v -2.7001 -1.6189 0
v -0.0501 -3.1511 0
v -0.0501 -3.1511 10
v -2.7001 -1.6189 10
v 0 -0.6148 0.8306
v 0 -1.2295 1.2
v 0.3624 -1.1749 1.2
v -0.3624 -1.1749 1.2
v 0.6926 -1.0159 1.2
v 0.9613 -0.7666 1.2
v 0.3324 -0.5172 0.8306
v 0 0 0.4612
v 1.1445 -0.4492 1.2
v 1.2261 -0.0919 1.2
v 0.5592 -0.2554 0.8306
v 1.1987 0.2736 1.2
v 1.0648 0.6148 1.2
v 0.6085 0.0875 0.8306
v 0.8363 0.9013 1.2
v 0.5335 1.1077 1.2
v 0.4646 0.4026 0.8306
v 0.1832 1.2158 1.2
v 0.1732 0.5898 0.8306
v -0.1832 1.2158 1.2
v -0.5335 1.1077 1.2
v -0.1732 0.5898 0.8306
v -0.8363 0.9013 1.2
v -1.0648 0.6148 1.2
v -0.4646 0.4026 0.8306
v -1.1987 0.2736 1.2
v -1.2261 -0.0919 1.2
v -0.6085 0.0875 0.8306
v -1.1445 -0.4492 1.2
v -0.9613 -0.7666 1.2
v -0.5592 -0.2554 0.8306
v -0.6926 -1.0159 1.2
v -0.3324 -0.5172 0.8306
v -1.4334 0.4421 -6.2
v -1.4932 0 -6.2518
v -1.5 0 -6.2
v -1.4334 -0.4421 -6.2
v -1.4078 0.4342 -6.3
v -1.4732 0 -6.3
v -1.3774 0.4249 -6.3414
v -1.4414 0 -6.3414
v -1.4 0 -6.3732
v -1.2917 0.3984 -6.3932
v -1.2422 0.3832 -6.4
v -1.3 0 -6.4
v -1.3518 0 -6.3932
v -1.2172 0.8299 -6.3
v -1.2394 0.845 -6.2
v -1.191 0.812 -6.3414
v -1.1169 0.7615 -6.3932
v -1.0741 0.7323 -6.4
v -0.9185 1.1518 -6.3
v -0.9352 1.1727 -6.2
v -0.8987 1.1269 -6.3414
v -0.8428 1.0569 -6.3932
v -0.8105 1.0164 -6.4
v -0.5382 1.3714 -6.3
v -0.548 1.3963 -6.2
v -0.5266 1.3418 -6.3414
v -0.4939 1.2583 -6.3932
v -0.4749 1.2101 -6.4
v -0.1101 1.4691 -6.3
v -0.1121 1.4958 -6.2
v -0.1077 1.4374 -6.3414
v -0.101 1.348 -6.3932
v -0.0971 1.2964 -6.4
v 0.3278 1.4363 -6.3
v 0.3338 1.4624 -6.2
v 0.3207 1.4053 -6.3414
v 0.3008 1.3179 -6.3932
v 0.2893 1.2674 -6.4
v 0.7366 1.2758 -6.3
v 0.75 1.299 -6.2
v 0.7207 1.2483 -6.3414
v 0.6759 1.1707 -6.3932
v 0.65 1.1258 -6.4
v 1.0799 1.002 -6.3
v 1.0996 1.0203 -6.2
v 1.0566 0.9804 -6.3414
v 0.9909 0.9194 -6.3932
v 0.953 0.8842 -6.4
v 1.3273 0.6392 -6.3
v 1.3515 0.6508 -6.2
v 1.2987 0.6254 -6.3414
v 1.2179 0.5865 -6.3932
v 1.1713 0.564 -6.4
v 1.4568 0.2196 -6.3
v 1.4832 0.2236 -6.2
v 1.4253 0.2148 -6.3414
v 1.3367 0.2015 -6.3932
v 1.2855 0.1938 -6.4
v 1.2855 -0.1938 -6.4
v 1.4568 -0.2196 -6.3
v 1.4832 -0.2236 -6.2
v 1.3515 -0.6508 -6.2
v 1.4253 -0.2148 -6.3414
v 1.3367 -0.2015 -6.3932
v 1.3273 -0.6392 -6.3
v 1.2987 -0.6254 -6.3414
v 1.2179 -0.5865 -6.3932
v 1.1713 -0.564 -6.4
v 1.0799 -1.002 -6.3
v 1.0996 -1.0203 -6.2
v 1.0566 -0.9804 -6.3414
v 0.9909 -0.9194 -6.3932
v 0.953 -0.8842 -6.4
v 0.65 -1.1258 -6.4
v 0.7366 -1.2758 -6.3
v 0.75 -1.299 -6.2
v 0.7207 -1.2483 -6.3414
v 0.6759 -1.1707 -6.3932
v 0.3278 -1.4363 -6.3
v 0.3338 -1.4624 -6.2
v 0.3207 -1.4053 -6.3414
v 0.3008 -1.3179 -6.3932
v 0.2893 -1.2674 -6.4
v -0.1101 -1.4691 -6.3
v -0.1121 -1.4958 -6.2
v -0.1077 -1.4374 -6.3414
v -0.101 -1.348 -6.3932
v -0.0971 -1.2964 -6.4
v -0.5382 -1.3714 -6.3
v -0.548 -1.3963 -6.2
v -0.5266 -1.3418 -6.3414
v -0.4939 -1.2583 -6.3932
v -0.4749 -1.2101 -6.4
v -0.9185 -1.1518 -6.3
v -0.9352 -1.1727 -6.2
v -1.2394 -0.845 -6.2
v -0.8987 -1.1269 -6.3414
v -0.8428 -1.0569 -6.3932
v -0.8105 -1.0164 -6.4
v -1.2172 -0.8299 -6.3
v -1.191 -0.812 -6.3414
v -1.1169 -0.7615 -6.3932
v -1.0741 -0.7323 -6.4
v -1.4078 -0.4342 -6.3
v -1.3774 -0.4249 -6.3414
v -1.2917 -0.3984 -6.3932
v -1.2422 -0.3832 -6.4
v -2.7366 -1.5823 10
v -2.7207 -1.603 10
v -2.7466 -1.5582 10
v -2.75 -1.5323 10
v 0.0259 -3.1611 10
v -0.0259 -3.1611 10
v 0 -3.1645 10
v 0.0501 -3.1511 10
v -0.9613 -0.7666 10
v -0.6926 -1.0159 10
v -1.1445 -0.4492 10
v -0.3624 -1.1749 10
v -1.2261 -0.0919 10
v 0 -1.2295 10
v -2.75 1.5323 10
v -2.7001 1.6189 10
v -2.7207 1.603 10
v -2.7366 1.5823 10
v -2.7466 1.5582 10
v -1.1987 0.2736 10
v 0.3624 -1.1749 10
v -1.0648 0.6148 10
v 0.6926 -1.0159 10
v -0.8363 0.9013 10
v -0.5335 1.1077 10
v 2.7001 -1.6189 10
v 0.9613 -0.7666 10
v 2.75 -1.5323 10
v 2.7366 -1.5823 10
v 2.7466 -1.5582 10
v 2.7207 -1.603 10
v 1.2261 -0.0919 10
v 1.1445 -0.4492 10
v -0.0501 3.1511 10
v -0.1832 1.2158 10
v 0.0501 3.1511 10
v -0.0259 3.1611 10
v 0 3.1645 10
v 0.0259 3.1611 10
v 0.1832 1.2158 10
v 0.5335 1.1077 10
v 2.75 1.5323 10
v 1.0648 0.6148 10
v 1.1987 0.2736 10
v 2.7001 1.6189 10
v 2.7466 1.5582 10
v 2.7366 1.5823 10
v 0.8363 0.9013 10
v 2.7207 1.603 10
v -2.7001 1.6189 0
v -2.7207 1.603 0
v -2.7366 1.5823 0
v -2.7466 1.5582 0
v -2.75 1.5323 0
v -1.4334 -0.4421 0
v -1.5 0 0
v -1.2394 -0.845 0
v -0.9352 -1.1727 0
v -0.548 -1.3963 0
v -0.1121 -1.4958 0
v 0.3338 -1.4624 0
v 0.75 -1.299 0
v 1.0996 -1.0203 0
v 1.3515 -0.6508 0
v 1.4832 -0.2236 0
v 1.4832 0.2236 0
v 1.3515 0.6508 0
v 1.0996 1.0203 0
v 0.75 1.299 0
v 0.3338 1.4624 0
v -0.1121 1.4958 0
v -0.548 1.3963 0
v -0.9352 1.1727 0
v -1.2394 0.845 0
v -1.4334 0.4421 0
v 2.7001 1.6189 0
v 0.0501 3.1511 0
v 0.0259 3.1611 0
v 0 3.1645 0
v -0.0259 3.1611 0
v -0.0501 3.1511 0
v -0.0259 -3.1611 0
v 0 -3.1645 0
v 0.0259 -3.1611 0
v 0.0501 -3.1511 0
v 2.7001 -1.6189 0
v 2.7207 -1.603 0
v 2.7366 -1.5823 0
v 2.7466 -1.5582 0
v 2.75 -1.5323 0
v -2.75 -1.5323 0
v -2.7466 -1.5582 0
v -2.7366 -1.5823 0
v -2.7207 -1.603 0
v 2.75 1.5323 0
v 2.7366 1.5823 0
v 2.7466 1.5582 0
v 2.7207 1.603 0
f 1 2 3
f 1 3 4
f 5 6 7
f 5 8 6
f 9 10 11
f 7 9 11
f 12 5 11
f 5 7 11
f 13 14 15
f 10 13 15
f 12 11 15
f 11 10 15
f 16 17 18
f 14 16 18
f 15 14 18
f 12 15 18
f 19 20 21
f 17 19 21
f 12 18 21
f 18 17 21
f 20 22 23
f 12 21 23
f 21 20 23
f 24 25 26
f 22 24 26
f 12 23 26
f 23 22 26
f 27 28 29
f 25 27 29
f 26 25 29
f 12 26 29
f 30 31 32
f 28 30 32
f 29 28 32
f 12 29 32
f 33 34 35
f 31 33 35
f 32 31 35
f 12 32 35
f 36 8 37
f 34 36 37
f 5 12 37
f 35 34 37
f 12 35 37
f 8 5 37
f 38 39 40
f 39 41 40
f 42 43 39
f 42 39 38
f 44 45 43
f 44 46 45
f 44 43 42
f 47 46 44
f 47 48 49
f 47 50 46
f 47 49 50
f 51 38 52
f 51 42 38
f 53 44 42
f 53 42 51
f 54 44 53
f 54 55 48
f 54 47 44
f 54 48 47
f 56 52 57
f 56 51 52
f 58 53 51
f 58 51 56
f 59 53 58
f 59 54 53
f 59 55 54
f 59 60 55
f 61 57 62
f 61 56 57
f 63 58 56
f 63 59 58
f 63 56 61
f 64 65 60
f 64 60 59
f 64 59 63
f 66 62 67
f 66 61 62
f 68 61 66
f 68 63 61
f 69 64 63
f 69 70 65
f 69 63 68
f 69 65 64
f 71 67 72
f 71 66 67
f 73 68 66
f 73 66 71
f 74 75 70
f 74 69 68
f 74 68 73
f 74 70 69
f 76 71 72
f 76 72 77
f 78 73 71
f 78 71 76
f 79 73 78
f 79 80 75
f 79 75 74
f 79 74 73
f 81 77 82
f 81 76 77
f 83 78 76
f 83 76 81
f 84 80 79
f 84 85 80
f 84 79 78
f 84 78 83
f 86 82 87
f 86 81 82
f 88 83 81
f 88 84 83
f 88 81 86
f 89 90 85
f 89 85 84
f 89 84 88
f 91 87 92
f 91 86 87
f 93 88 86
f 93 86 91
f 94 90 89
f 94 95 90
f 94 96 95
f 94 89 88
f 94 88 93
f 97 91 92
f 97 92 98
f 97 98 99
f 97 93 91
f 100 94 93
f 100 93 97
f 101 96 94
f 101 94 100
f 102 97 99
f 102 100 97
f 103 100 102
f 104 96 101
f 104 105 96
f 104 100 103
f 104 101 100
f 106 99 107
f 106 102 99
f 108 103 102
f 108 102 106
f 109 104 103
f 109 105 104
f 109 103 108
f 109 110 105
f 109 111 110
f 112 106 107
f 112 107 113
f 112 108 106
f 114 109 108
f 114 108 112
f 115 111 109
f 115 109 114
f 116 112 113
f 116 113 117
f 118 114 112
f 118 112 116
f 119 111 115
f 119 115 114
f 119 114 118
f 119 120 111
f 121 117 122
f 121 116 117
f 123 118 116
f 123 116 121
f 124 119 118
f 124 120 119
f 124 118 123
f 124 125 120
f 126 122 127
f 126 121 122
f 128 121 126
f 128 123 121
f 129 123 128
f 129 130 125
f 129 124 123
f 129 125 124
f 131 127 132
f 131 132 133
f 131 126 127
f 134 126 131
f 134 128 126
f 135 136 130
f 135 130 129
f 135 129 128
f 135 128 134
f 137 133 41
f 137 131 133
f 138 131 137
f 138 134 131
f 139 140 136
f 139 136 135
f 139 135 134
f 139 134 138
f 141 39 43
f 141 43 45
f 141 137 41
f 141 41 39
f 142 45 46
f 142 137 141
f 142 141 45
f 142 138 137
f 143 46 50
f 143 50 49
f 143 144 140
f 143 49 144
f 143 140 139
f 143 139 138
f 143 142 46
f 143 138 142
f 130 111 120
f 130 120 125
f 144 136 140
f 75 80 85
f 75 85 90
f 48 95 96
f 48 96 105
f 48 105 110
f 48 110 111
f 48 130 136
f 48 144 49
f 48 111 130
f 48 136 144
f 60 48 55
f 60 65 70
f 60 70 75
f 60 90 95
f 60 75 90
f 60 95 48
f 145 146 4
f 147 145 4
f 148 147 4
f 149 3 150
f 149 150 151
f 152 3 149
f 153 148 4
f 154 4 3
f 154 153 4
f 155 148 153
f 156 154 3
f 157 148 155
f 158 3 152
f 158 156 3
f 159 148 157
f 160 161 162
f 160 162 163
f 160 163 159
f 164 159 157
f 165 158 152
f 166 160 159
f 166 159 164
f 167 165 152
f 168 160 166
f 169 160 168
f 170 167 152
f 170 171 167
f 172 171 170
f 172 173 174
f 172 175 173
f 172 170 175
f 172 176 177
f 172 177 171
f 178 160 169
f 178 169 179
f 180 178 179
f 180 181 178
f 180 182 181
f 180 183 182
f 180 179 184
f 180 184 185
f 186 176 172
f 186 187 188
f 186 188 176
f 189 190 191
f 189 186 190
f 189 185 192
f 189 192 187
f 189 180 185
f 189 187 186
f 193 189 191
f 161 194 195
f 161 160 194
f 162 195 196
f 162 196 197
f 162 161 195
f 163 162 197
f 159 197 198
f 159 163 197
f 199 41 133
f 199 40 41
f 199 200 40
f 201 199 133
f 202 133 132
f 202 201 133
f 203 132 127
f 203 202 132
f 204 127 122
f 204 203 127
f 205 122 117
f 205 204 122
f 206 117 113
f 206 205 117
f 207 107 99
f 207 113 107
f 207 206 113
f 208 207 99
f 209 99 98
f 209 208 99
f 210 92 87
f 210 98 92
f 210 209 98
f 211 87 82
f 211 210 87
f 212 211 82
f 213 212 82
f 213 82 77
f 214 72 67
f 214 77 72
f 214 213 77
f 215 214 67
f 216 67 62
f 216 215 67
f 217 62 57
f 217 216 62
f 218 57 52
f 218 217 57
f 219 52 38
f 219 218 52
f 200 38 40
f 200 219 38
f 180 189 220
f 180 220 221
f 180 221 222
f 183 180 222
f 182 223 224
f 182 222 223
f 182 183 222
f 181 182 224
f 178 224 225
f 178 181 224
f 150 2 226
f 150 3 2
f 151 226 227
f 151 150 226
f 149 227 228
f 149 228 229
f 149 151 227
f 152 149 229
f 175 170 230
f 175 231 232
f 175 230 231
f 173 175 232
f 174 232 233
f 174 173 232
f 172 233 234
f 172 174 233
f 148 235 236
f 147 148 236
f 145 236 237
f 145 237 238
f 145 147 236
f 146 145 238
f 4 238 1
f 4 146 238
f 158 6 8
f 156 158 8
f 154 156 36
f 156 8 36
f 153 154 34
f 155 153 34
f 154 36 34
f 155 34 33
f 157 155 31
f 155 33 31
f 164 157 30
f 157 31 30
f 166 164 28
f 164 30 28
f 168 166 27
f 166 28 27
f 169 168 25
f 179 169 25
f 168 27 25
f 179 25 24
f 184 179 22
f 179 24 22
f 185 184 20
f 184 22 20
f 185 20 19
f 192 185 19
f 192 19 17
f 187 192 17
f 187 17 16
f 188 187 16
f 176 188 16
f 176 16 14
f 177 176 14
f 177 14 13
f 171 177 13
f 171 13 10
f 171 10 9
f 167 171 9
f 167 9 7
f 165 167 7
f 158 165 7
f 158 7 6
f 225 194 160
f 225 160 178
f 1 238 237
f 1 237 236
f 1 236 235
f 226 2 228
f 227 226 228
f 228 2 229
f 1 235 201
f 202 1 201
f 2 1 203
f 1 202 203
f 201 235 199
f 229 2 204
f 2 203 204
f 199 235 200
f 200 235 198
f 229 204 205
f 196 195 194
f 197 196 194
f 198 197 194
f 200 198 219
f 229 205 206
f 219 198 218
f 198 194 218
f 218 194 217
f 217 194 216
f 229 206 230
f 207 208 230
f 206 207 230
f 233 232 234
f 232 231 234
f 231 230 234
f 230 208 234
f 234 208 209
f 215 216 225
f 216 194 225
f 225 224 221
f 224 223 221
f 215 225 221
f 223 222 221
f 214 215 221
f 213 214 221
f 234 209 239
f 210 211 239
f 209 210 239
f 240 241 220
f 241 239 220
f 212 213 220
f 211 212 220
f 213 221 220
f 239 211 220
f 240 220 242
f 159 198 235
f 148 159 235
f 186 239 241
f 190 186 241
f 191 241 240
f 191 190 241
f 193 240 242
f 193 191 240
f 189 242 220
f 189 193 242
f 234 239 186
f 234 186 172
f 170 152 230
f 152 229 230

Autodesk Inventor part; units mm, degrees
ref_plane "YZ Plane" through (0, 0, 0) normal (1, 0, 0) x (0, 1, 0)
ref_plane "XZ Plane" through (0, 0, 0) normal (0, 1, 0) x (-1, 0, 0)
ref_plane "XY Plane" through (0, 0, 0) normal (0, 0, 1) x (1, 0, 0)
sketch "Sketch1" plane through (0, 0, 0) normal (0, 0, 1) x (1, 0, 0)
  line L0 (-2.75, 1.59) -> (0, 3.18)
  line L1 (0, -3.18) -> (-2.75, -1.59)
  line L2 (-2.75, 1.59) -> (-2.75, -1.59)
  line L3 (2.75, 1.59) -> (0, 3.18)
  line L4 (0, -3.18) -> (2.75, -1.59)
  line L5 (2.75, 1.59) -> (2.75, -1.59)
  point P0 (0, 0)
extrude "Extrusion1" add sketch "Sketch1" along normal blind 10
sketch "Sketch2" plane through (0, 0, 10) normal (0, 0, 1) x (1, 0, 0)
  circle A0 centre (0, 0) radius 1.5
  dimension "d20" = 3
hole "Hole1" at (0, 0, 10) direction (0, 0, -1) diameter 2.459 depth 8.8 tip angle 118 thread size "M3x0.5" class "6H" standard "ISO Metric profile"
fillet "Fillet1" radius 0.1 6 edges at (0, 3.18, 5) (2.75, 1.59, 5) (-2.75, 1.59, 5) (2.75, -1.59, 5) (0, -3.18, 5) (-2.75, -1.59, 5)
sketch "Sketch4" plane through (0, 0, 0) normal (0, 0, -1) x (-1, 0, 0)
  circle A0 centre (0, 0) radius 1.5
  dimension "d29" = 3
extrude "Extrusion2" add sketch "Sketch4" along normal blind 6.4
thread "Thread1" size "M3x0.5" class "6g" standard "ANSI Metric M Profile" length 9.967
fillet "Fillet2" radius 0.2 1 edges at (1.5, 0, -6.4)
properties part number "spacer 10mm" material "Steel, Mild"
